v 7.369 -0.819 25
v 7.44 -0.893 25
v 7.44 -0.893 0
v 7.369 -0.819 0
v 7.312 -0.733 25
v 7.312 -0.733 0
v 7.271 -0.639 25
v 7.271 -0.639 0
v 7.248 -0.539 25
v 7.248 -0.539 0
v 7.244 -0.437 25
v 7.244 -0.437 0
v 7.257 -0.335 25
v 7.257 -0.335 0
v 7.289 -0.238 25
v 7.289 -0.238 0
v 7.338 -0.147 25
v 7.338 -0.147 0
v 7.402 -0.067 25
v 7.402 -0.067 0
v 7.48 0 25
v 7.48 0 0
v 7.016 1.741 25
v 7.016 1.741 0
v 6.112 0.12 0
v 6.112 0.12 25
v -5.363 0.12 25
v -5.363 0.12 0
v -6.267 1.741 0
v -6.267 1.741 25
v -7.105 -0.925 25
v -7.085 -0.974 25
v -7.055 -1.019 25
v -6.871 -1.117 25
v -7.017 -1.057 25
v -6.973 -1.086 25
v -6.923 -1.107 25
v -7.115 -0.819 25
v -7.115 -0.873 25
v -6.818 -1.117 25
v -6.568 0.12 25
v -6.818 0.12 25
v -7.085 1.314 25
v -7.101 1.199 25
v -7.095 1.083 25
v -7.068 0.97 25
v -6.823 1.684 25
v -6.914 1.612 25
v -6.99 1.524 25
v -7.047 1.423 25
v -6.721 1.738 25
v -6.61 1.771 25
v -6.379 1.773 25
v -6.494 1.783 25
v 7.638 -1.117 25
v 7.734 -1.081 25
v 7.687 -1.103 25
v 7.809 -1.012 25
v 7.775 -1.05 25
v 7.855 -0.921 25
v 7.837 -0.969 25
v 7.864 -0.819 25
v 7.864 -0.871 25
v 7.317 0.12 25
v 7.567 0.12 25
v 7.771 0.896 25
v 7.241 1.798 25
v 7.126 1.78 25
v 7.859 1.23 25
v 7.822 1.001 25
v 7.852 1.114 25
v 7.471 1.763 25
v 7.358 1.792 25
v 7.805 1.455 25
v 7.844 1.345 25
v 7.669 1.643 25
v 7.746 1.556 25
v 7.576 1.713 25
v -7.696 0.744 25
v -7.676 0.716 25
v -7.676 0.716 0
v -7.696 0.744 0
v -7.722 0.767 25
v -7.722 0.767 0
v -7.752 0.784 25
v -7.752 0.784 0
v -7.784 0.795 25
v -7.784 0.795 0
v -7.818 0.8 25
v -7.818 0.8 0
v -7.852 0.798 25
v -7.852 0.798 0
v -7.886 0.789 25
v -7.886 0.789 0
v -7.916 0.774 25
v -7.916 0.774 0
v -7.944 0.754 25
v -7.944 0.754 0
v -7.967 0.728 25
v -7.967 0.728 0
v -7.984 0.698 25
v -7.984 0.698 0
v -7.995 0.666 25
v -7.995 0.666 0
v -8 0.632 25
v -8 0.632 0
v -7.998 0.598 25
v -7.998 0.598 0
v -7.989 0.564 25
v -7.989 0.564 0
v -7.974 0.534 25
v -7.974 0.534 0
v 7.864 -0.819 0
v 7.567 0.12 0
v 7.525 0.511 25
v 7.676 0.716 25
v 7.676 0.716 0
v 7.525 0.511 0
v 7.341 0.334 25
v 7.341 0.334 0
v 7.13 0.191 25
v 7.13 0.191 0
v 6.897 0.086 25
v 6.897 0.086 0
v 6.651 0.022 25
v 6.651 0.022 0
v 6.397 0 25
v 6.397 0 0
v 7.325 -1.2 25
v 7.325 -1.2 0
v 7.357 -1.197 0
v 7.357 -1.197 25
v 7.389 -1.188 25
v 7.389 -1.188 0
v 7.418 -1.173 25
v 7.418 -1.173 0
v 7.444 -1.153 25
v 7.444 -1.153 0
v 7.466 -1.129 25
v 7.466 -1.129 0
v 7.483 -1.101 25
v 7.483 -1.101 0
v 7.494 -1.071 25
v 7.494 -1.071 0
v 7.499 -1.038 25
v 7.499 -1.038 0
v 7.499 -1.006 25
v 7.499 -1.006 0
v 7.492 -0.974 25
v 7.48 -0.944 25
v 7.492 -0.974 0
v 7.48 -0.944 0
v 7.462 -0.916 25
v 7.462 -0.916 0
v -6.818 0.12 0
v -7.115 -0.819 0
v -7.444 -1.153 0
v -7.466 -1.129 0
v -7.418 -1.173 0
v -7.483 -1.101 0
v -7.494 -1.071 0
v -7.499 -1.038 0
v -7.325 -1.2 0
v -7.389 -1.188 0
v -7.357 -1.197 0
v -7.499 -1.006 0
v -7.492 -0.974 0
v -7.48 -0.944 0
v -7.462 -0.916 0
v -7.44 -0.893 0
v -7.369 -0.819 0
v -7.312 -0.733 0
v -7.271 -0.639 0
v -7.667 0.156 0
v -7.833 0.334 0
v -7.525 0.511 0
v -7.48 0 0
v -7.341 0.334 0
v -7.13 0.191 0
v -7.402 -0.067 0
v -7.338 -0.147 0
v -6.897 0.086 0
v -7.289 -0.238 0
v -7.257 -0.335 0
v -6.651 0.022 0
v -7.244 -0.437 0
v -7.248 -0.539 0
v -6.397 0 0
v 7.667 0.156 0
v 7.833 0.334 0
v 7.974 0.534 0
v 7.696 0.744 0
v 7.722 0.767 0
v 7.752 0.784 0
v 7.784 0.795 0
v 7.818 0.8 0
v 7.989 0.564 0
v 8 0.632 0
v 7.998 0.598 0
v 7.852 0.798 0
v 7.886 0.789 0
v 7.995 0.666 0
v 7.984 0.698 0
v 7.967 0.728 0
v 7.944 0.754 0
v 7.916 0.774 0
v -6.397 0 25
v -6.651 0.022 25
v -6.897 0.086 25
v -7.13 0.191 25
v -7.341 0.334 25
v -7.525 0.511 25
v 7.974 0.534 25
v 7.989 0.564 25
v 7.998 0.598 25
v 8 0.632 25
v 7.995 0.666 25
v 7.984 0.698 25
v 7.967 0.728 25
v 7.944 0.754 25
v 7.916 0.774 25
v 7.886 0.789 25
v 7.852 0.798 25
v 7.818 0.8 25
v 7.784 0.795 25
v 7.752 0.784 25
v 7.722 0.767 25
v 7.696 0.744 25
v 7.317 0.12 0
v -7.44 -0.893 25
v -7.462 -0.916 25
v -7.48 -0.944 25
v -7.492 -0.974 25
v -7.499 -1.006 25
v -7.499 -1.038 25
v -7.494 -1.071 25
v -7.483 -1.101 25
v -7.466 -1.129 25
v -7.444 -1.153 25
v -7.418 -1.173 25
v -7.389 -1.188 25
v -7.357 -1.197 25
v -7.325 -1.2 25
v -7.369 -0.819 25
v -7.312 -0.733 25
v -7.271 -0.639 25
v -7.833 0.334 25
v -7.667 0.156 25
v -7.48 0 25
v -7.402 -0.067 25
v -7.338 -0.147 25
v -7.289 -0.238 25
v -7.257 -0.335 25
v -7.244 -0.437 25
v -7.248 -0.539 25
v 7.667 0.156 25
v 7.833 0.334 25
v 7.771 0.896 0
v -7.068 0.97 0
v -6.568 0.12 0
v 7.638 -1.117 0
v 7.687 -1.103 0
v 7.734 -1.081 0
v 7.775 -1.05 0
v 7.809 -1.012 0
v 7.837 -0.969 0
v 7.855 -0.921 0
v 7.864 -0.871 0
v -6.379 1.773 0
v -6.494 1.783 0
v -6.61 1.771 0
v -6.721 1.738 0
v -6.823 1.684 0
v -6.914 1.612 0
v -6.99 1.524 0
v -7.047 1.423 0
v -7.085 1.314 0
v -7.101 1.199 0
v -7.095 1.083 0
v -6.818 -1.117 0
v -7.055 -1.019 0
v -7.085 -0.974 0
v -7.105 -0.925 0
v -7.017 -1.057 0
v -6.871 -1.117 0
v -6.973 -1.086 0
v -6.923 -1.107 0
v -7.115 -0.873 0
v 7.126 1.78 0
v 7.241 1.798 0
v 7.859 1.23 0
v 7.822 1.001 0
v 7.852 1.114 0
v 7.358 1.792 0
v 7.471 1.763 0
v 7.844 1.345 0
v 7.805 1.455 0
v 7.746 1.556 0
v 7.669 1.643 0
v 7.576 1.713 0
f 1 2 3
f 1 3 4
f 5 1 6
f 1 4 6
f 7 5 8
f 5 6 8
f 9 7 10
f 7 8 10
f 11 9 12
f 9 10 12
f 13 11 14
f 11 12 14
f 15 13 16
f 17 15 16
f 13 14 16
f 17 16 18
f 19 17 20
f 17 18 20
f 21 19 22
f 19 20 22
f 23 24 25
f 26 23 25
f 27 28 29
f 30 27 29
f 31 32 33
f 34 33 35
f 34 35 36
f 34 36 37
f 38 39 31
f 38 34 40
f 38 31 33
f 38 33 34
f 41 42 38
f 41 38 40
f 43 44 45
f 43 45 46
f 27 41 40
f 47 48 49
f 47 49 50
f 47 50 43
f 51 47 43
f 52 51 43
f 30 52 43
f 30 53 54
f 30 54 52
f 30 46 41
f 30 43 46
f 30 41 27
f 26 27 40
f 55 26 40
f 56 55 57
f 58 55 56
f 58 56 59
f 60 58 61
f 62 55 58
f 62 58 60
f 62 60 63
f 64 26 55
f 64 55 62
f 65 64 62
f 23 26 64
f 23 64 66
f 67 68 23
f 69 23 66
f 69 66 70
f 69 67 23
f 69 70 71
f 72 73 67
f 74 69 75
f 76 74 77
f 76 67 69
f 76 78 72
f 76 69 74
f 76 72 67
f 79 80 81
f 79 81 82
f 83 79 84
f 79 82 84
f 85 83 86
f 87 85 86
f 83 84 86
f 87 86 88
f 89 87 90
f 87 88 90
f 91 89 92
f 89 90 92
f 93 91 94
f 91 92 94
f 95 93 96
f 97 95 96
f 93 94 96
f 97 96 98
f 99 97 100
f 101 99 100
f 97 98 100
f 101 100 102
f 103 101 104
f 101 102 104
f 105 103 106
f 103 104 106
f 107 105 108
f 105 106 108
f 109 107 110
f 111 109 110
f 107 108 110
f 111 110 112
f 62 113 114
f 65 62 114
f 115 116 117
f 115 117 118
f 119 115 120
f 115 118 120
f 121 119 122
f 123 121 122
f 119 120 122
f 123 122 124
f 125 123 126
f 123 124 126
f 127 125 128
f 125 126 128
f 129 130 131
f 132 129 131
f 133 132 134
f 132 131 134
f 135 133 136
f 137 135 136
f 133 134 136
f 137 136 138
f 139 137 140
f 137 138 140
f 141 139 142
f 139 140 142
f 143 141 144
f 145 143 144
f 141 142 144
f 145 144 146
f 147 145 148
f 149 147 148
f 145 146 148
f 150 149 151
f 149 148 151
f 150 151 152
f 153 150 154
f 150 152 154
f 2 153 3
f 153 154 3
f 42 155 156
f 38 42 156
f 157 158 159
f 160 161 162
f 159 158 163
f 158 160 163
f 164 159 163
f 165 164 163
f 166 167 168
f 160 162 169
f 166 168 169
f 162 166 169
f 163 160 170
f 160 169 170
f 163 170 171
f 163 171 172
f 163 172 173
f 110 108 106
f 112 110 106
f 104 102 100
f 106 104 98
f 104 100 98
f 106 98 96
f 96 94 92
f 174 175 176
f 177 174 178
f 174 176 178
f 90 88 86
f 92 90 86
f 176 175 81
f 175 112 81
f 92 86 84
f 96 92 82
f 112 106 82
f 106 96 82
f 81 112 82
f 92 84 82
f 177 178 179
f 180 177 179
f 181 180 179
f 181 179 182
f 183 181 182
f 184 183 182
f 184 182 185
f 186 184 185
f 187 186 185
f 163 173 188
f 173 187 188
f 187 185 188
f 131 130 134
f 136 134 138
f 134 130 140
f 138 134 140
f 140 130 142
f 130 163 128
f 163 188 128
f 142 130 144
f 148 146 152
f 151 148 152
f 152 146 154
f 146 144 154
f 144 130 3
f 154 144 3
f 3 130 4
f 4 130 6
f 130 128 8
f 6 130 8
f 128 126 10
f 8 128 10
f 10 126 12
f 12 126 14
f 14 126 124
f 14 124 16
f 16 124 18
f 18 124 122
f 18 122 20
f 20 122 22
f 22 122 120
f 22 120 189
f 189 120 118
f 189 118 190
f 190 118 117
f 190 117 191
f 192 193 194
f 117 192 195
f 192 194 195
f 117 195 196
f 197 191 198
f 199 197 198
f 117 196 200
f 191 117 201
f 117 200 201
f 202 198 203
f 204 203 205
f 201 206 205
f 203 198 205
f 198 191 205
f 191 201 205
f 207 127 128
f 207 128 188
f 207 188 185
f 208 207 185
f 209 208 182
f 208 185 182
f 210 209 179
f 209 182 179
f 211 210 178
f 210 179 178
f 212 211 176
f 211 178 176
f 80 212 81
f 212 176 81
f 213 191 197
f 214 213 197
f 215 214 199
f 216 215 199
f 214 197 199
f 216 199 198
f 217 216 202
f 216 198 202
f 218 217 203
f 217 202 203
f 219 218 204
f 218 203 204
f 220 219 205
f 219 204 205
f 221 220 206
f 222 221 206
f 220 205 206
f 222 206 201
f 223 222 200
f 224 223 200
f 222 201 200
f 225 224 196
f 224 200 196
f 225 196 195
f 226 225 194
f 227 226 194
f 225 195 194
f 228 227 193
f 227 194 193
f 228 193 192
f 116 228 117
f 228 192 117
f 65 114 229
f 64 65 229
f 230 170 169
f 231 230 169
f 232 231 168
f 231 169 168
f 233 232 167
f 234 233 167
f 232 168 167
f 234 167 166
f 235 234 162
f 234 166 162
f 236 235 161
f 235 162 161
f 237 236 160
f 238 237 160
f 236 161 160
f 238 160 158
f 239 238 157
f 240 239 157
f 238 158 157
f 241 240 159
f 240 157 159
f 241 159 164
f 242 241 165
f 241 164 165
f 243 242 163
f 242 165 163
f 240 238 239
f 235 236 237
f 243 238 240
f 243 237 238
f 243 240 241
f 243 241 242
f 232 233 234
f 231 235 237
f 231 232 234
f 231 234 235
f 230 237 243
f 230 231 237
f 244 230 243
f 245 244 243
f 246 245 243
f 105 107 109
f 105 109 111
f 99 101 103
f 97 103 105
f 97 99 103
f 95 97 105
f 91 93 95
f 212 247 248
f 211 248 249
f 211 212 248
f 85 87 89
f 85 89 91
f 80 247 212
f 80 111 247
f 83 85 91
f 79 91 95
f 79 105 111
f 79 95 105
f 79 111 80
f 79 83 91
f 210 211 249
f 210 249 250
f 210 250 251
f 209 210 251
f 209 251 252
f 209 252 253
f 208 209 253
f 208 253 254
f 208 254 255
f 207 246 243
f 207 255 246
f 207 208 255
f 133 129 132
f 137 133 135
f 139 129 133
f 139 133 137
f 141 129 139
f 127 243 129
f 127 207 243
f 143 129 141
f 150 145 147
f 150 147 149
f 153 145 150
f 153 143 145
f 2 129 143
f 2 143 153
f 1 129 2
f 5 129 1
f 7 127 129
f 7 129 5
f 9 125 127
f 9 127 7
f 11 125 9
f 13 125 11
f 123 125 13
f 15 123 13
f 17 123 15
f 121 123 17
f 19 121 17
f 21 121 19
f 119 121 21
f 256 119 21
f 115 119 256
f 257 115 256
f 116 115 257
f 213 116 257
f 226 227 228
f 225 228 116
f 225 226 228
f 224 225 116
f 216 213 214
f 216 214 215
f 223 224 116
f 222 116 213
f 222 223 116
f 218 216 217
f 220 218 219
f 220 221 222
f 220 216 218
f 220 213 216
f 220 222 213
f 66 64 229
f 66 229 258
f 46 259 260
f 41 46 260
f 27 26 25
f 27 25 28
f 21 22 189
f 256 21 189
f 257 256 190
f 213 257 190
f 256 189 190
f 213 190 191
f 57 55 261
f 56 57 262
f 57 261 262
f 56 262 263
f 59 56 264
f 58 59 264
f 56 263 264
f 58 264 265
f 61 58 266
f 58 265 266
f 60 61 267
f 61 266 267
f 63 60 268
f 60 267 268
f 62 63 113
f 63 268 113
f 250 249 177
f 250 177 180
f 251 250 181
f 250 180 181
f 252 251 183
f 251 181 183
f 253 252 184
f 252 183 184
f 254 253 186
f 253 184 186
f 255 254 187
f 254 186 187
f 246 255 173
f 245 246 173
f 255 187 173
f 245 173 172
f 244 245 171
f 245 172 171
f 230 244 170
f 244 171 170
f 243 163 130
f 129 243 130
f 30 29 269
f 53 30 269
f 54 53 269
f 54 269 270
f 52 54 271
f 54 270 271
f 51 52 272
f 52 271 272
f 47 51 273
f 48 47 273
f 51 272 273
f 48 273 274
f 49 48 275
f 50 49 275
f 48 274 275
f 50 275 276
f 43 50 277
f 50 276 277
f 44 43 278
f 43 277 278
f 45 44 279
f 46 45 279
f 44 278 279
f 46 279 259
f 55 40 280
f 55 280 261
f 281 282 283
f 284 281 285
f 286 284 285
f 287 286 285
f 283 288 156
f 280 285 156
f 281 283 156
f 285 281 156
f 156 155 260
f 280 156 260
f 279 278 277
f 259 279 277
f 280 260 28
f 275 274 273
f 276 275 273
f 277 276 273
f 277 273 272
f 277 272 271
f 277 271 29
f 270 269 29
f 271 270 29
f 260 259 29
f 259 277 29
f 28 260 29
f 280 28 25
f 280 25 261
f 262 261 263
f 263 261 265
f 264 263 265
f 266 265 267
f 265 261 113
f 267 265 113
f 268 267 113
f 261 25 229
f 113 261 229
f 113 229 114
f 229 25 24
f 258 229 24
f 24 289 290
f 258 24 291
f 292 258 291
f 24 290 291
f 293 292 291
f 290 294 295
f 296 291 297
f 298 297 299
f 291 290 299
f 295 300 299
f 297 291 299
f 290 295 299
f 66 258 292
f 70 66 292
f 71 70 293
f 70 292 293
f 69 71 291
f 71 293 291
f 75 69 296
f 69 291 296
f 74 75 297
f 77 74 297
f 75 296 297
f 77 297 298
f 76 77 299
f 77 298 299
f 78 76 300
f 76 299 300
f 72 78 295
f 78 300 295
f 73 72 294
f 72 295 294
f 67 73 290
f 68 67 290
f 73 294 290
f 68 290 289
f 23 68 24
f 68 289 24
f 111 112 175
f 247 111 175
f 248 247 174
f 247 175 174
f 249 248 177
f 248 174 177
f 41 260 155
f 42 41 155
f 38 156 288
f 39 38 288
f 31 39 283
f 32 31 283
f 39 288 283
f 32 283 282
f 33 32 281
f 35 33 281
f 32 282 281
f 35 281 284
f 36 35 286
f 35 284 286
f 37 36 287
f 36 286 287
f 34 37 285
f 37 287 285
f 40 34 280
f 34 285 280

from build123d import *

# Parameters (mm, degrees)
F1_DEPTH = 250
F2_SCALE = 0.1
F4_DEPTH = 25


# Not quite as in the source:
# - ends of sketch curves that miss each other by under 0.0002 mm in the source are joined


with BuildPart() as f1:
    # F0 (on Top) → F1 (new body)
    with BuildSketch(Plane.XY):
        with BuildLine():
            Line((-53.633557, 1.195441), (-62.6724906028, 17.4106930814))
            ThreePointArc((-62.6724906028, 17.4106930814), (-69.142266545, 16.1210302987), (-70.6766850708, 9.7048951206))
            Line((-70.6766850708, 9.7048951206), (-65.684308, 1.195441))
            Line((-65.684308, 1.195441), (-68.17694, 1.195441))
            Line((-68.17694, 1.195441), (-71.1491983328, -8.1931208927))
            ThreePointArc((-71.1491983328, -8.1931208927), (-70.3707522269, -10.3869306581), (-68.1769443193, -11.165382))
            Line((-68.1769443193, -11.165382), (76.3786361624, -11.165382))
            ThreePointArc((76.3786361624, -11.165382), (78.0948325124, -10.1247630324), (78.6397955471, -8.1931230456))
            Line((78.6397955471, -8.1931230456), (75.667537, 1.195441))
            Line((75.667537, 1.195441), (73.174905, 1.195441))
            Line((73.174905, 1.195441), (77.7065557459, 8.9645952796))
            ThreePointArc((77.7065557459, 8.9645952796), (77.0978016072, 16.0125981458), (70.1630878027, 17.41069344))
            Line((70.1630878027, 17.41069344), (61.124154, 1.195441))
            Line((61.124154, 1.195441), (-53.633557, 1.195441))
        make_face()
    extrude(amount=F1_DEPTH)


with BuildPart() as f1_1:
    # F2: moved
    add(f1.part.scale(F2_SCALE))


with BuildPart() as f4:
    # F3 (on Top) → F4 (new body)
    with BuildSketch(Plane.XY):
        with BuildLine():
            ThreePointArc((7.9742238776, 0.5335820896), (7.9164179104, 0.7742238776), (7.6757761224, 0.7164179104))
            ThreePointArc((7.6757761224, 0.7164179104), (7.1297309804, 0.1913034855), (6.3967143143, 0))
            Line((6.3967143143, 0), (0, 0))
            Line((0, 0), (-6.3967143143, 0))
            ThreePointArc((-6.3967143143, 0), (-7.1297309804, 0.1913034855), (-7.6757761224, 0.7164179104))
            ThreePointArc((-7.6757761224, 0.7164179104), (-7.9164179104, 0.7742238776), (-7.9742238776, 0.5335820896))
            ThreePointArc((-7.9742238776, 0.5335820896), (-7.7533706188, 0.2422306764), (-7.4795347057, 0))
            ThreePointArc((-7.4795347057, 0), (-7.2437138511, -0.4367609962), (-7.4396680049, -0.8928022366))
            ThreePointArc((-7.4396680049, -0.8928022366), (-7.4889506154, -1.0861980041), (-7.325, -1.2))
            Line((-7.325, -1.2), (0, -1.2))
            Line((0, -1.2), (7.325, -1.2))
            ThreePointArc((7.325, -1.2), (7.4889506154, -1.0861980041), (7.4396680049, -0.8928022366))
            ThreePointArc((7.4396680049, -0.8928022366), (7.2437138511, -0.4367609962), (7.4795347057, 0))
            ThreePointArc((7.4795347057, 0), (7.7533706188, 0.2422306764), (7.9742238776, 0.5335820896))
        make_face()
    extrude(amount=F4_DEPTH)


solid = Compound([f1_1.part, f4.part])
